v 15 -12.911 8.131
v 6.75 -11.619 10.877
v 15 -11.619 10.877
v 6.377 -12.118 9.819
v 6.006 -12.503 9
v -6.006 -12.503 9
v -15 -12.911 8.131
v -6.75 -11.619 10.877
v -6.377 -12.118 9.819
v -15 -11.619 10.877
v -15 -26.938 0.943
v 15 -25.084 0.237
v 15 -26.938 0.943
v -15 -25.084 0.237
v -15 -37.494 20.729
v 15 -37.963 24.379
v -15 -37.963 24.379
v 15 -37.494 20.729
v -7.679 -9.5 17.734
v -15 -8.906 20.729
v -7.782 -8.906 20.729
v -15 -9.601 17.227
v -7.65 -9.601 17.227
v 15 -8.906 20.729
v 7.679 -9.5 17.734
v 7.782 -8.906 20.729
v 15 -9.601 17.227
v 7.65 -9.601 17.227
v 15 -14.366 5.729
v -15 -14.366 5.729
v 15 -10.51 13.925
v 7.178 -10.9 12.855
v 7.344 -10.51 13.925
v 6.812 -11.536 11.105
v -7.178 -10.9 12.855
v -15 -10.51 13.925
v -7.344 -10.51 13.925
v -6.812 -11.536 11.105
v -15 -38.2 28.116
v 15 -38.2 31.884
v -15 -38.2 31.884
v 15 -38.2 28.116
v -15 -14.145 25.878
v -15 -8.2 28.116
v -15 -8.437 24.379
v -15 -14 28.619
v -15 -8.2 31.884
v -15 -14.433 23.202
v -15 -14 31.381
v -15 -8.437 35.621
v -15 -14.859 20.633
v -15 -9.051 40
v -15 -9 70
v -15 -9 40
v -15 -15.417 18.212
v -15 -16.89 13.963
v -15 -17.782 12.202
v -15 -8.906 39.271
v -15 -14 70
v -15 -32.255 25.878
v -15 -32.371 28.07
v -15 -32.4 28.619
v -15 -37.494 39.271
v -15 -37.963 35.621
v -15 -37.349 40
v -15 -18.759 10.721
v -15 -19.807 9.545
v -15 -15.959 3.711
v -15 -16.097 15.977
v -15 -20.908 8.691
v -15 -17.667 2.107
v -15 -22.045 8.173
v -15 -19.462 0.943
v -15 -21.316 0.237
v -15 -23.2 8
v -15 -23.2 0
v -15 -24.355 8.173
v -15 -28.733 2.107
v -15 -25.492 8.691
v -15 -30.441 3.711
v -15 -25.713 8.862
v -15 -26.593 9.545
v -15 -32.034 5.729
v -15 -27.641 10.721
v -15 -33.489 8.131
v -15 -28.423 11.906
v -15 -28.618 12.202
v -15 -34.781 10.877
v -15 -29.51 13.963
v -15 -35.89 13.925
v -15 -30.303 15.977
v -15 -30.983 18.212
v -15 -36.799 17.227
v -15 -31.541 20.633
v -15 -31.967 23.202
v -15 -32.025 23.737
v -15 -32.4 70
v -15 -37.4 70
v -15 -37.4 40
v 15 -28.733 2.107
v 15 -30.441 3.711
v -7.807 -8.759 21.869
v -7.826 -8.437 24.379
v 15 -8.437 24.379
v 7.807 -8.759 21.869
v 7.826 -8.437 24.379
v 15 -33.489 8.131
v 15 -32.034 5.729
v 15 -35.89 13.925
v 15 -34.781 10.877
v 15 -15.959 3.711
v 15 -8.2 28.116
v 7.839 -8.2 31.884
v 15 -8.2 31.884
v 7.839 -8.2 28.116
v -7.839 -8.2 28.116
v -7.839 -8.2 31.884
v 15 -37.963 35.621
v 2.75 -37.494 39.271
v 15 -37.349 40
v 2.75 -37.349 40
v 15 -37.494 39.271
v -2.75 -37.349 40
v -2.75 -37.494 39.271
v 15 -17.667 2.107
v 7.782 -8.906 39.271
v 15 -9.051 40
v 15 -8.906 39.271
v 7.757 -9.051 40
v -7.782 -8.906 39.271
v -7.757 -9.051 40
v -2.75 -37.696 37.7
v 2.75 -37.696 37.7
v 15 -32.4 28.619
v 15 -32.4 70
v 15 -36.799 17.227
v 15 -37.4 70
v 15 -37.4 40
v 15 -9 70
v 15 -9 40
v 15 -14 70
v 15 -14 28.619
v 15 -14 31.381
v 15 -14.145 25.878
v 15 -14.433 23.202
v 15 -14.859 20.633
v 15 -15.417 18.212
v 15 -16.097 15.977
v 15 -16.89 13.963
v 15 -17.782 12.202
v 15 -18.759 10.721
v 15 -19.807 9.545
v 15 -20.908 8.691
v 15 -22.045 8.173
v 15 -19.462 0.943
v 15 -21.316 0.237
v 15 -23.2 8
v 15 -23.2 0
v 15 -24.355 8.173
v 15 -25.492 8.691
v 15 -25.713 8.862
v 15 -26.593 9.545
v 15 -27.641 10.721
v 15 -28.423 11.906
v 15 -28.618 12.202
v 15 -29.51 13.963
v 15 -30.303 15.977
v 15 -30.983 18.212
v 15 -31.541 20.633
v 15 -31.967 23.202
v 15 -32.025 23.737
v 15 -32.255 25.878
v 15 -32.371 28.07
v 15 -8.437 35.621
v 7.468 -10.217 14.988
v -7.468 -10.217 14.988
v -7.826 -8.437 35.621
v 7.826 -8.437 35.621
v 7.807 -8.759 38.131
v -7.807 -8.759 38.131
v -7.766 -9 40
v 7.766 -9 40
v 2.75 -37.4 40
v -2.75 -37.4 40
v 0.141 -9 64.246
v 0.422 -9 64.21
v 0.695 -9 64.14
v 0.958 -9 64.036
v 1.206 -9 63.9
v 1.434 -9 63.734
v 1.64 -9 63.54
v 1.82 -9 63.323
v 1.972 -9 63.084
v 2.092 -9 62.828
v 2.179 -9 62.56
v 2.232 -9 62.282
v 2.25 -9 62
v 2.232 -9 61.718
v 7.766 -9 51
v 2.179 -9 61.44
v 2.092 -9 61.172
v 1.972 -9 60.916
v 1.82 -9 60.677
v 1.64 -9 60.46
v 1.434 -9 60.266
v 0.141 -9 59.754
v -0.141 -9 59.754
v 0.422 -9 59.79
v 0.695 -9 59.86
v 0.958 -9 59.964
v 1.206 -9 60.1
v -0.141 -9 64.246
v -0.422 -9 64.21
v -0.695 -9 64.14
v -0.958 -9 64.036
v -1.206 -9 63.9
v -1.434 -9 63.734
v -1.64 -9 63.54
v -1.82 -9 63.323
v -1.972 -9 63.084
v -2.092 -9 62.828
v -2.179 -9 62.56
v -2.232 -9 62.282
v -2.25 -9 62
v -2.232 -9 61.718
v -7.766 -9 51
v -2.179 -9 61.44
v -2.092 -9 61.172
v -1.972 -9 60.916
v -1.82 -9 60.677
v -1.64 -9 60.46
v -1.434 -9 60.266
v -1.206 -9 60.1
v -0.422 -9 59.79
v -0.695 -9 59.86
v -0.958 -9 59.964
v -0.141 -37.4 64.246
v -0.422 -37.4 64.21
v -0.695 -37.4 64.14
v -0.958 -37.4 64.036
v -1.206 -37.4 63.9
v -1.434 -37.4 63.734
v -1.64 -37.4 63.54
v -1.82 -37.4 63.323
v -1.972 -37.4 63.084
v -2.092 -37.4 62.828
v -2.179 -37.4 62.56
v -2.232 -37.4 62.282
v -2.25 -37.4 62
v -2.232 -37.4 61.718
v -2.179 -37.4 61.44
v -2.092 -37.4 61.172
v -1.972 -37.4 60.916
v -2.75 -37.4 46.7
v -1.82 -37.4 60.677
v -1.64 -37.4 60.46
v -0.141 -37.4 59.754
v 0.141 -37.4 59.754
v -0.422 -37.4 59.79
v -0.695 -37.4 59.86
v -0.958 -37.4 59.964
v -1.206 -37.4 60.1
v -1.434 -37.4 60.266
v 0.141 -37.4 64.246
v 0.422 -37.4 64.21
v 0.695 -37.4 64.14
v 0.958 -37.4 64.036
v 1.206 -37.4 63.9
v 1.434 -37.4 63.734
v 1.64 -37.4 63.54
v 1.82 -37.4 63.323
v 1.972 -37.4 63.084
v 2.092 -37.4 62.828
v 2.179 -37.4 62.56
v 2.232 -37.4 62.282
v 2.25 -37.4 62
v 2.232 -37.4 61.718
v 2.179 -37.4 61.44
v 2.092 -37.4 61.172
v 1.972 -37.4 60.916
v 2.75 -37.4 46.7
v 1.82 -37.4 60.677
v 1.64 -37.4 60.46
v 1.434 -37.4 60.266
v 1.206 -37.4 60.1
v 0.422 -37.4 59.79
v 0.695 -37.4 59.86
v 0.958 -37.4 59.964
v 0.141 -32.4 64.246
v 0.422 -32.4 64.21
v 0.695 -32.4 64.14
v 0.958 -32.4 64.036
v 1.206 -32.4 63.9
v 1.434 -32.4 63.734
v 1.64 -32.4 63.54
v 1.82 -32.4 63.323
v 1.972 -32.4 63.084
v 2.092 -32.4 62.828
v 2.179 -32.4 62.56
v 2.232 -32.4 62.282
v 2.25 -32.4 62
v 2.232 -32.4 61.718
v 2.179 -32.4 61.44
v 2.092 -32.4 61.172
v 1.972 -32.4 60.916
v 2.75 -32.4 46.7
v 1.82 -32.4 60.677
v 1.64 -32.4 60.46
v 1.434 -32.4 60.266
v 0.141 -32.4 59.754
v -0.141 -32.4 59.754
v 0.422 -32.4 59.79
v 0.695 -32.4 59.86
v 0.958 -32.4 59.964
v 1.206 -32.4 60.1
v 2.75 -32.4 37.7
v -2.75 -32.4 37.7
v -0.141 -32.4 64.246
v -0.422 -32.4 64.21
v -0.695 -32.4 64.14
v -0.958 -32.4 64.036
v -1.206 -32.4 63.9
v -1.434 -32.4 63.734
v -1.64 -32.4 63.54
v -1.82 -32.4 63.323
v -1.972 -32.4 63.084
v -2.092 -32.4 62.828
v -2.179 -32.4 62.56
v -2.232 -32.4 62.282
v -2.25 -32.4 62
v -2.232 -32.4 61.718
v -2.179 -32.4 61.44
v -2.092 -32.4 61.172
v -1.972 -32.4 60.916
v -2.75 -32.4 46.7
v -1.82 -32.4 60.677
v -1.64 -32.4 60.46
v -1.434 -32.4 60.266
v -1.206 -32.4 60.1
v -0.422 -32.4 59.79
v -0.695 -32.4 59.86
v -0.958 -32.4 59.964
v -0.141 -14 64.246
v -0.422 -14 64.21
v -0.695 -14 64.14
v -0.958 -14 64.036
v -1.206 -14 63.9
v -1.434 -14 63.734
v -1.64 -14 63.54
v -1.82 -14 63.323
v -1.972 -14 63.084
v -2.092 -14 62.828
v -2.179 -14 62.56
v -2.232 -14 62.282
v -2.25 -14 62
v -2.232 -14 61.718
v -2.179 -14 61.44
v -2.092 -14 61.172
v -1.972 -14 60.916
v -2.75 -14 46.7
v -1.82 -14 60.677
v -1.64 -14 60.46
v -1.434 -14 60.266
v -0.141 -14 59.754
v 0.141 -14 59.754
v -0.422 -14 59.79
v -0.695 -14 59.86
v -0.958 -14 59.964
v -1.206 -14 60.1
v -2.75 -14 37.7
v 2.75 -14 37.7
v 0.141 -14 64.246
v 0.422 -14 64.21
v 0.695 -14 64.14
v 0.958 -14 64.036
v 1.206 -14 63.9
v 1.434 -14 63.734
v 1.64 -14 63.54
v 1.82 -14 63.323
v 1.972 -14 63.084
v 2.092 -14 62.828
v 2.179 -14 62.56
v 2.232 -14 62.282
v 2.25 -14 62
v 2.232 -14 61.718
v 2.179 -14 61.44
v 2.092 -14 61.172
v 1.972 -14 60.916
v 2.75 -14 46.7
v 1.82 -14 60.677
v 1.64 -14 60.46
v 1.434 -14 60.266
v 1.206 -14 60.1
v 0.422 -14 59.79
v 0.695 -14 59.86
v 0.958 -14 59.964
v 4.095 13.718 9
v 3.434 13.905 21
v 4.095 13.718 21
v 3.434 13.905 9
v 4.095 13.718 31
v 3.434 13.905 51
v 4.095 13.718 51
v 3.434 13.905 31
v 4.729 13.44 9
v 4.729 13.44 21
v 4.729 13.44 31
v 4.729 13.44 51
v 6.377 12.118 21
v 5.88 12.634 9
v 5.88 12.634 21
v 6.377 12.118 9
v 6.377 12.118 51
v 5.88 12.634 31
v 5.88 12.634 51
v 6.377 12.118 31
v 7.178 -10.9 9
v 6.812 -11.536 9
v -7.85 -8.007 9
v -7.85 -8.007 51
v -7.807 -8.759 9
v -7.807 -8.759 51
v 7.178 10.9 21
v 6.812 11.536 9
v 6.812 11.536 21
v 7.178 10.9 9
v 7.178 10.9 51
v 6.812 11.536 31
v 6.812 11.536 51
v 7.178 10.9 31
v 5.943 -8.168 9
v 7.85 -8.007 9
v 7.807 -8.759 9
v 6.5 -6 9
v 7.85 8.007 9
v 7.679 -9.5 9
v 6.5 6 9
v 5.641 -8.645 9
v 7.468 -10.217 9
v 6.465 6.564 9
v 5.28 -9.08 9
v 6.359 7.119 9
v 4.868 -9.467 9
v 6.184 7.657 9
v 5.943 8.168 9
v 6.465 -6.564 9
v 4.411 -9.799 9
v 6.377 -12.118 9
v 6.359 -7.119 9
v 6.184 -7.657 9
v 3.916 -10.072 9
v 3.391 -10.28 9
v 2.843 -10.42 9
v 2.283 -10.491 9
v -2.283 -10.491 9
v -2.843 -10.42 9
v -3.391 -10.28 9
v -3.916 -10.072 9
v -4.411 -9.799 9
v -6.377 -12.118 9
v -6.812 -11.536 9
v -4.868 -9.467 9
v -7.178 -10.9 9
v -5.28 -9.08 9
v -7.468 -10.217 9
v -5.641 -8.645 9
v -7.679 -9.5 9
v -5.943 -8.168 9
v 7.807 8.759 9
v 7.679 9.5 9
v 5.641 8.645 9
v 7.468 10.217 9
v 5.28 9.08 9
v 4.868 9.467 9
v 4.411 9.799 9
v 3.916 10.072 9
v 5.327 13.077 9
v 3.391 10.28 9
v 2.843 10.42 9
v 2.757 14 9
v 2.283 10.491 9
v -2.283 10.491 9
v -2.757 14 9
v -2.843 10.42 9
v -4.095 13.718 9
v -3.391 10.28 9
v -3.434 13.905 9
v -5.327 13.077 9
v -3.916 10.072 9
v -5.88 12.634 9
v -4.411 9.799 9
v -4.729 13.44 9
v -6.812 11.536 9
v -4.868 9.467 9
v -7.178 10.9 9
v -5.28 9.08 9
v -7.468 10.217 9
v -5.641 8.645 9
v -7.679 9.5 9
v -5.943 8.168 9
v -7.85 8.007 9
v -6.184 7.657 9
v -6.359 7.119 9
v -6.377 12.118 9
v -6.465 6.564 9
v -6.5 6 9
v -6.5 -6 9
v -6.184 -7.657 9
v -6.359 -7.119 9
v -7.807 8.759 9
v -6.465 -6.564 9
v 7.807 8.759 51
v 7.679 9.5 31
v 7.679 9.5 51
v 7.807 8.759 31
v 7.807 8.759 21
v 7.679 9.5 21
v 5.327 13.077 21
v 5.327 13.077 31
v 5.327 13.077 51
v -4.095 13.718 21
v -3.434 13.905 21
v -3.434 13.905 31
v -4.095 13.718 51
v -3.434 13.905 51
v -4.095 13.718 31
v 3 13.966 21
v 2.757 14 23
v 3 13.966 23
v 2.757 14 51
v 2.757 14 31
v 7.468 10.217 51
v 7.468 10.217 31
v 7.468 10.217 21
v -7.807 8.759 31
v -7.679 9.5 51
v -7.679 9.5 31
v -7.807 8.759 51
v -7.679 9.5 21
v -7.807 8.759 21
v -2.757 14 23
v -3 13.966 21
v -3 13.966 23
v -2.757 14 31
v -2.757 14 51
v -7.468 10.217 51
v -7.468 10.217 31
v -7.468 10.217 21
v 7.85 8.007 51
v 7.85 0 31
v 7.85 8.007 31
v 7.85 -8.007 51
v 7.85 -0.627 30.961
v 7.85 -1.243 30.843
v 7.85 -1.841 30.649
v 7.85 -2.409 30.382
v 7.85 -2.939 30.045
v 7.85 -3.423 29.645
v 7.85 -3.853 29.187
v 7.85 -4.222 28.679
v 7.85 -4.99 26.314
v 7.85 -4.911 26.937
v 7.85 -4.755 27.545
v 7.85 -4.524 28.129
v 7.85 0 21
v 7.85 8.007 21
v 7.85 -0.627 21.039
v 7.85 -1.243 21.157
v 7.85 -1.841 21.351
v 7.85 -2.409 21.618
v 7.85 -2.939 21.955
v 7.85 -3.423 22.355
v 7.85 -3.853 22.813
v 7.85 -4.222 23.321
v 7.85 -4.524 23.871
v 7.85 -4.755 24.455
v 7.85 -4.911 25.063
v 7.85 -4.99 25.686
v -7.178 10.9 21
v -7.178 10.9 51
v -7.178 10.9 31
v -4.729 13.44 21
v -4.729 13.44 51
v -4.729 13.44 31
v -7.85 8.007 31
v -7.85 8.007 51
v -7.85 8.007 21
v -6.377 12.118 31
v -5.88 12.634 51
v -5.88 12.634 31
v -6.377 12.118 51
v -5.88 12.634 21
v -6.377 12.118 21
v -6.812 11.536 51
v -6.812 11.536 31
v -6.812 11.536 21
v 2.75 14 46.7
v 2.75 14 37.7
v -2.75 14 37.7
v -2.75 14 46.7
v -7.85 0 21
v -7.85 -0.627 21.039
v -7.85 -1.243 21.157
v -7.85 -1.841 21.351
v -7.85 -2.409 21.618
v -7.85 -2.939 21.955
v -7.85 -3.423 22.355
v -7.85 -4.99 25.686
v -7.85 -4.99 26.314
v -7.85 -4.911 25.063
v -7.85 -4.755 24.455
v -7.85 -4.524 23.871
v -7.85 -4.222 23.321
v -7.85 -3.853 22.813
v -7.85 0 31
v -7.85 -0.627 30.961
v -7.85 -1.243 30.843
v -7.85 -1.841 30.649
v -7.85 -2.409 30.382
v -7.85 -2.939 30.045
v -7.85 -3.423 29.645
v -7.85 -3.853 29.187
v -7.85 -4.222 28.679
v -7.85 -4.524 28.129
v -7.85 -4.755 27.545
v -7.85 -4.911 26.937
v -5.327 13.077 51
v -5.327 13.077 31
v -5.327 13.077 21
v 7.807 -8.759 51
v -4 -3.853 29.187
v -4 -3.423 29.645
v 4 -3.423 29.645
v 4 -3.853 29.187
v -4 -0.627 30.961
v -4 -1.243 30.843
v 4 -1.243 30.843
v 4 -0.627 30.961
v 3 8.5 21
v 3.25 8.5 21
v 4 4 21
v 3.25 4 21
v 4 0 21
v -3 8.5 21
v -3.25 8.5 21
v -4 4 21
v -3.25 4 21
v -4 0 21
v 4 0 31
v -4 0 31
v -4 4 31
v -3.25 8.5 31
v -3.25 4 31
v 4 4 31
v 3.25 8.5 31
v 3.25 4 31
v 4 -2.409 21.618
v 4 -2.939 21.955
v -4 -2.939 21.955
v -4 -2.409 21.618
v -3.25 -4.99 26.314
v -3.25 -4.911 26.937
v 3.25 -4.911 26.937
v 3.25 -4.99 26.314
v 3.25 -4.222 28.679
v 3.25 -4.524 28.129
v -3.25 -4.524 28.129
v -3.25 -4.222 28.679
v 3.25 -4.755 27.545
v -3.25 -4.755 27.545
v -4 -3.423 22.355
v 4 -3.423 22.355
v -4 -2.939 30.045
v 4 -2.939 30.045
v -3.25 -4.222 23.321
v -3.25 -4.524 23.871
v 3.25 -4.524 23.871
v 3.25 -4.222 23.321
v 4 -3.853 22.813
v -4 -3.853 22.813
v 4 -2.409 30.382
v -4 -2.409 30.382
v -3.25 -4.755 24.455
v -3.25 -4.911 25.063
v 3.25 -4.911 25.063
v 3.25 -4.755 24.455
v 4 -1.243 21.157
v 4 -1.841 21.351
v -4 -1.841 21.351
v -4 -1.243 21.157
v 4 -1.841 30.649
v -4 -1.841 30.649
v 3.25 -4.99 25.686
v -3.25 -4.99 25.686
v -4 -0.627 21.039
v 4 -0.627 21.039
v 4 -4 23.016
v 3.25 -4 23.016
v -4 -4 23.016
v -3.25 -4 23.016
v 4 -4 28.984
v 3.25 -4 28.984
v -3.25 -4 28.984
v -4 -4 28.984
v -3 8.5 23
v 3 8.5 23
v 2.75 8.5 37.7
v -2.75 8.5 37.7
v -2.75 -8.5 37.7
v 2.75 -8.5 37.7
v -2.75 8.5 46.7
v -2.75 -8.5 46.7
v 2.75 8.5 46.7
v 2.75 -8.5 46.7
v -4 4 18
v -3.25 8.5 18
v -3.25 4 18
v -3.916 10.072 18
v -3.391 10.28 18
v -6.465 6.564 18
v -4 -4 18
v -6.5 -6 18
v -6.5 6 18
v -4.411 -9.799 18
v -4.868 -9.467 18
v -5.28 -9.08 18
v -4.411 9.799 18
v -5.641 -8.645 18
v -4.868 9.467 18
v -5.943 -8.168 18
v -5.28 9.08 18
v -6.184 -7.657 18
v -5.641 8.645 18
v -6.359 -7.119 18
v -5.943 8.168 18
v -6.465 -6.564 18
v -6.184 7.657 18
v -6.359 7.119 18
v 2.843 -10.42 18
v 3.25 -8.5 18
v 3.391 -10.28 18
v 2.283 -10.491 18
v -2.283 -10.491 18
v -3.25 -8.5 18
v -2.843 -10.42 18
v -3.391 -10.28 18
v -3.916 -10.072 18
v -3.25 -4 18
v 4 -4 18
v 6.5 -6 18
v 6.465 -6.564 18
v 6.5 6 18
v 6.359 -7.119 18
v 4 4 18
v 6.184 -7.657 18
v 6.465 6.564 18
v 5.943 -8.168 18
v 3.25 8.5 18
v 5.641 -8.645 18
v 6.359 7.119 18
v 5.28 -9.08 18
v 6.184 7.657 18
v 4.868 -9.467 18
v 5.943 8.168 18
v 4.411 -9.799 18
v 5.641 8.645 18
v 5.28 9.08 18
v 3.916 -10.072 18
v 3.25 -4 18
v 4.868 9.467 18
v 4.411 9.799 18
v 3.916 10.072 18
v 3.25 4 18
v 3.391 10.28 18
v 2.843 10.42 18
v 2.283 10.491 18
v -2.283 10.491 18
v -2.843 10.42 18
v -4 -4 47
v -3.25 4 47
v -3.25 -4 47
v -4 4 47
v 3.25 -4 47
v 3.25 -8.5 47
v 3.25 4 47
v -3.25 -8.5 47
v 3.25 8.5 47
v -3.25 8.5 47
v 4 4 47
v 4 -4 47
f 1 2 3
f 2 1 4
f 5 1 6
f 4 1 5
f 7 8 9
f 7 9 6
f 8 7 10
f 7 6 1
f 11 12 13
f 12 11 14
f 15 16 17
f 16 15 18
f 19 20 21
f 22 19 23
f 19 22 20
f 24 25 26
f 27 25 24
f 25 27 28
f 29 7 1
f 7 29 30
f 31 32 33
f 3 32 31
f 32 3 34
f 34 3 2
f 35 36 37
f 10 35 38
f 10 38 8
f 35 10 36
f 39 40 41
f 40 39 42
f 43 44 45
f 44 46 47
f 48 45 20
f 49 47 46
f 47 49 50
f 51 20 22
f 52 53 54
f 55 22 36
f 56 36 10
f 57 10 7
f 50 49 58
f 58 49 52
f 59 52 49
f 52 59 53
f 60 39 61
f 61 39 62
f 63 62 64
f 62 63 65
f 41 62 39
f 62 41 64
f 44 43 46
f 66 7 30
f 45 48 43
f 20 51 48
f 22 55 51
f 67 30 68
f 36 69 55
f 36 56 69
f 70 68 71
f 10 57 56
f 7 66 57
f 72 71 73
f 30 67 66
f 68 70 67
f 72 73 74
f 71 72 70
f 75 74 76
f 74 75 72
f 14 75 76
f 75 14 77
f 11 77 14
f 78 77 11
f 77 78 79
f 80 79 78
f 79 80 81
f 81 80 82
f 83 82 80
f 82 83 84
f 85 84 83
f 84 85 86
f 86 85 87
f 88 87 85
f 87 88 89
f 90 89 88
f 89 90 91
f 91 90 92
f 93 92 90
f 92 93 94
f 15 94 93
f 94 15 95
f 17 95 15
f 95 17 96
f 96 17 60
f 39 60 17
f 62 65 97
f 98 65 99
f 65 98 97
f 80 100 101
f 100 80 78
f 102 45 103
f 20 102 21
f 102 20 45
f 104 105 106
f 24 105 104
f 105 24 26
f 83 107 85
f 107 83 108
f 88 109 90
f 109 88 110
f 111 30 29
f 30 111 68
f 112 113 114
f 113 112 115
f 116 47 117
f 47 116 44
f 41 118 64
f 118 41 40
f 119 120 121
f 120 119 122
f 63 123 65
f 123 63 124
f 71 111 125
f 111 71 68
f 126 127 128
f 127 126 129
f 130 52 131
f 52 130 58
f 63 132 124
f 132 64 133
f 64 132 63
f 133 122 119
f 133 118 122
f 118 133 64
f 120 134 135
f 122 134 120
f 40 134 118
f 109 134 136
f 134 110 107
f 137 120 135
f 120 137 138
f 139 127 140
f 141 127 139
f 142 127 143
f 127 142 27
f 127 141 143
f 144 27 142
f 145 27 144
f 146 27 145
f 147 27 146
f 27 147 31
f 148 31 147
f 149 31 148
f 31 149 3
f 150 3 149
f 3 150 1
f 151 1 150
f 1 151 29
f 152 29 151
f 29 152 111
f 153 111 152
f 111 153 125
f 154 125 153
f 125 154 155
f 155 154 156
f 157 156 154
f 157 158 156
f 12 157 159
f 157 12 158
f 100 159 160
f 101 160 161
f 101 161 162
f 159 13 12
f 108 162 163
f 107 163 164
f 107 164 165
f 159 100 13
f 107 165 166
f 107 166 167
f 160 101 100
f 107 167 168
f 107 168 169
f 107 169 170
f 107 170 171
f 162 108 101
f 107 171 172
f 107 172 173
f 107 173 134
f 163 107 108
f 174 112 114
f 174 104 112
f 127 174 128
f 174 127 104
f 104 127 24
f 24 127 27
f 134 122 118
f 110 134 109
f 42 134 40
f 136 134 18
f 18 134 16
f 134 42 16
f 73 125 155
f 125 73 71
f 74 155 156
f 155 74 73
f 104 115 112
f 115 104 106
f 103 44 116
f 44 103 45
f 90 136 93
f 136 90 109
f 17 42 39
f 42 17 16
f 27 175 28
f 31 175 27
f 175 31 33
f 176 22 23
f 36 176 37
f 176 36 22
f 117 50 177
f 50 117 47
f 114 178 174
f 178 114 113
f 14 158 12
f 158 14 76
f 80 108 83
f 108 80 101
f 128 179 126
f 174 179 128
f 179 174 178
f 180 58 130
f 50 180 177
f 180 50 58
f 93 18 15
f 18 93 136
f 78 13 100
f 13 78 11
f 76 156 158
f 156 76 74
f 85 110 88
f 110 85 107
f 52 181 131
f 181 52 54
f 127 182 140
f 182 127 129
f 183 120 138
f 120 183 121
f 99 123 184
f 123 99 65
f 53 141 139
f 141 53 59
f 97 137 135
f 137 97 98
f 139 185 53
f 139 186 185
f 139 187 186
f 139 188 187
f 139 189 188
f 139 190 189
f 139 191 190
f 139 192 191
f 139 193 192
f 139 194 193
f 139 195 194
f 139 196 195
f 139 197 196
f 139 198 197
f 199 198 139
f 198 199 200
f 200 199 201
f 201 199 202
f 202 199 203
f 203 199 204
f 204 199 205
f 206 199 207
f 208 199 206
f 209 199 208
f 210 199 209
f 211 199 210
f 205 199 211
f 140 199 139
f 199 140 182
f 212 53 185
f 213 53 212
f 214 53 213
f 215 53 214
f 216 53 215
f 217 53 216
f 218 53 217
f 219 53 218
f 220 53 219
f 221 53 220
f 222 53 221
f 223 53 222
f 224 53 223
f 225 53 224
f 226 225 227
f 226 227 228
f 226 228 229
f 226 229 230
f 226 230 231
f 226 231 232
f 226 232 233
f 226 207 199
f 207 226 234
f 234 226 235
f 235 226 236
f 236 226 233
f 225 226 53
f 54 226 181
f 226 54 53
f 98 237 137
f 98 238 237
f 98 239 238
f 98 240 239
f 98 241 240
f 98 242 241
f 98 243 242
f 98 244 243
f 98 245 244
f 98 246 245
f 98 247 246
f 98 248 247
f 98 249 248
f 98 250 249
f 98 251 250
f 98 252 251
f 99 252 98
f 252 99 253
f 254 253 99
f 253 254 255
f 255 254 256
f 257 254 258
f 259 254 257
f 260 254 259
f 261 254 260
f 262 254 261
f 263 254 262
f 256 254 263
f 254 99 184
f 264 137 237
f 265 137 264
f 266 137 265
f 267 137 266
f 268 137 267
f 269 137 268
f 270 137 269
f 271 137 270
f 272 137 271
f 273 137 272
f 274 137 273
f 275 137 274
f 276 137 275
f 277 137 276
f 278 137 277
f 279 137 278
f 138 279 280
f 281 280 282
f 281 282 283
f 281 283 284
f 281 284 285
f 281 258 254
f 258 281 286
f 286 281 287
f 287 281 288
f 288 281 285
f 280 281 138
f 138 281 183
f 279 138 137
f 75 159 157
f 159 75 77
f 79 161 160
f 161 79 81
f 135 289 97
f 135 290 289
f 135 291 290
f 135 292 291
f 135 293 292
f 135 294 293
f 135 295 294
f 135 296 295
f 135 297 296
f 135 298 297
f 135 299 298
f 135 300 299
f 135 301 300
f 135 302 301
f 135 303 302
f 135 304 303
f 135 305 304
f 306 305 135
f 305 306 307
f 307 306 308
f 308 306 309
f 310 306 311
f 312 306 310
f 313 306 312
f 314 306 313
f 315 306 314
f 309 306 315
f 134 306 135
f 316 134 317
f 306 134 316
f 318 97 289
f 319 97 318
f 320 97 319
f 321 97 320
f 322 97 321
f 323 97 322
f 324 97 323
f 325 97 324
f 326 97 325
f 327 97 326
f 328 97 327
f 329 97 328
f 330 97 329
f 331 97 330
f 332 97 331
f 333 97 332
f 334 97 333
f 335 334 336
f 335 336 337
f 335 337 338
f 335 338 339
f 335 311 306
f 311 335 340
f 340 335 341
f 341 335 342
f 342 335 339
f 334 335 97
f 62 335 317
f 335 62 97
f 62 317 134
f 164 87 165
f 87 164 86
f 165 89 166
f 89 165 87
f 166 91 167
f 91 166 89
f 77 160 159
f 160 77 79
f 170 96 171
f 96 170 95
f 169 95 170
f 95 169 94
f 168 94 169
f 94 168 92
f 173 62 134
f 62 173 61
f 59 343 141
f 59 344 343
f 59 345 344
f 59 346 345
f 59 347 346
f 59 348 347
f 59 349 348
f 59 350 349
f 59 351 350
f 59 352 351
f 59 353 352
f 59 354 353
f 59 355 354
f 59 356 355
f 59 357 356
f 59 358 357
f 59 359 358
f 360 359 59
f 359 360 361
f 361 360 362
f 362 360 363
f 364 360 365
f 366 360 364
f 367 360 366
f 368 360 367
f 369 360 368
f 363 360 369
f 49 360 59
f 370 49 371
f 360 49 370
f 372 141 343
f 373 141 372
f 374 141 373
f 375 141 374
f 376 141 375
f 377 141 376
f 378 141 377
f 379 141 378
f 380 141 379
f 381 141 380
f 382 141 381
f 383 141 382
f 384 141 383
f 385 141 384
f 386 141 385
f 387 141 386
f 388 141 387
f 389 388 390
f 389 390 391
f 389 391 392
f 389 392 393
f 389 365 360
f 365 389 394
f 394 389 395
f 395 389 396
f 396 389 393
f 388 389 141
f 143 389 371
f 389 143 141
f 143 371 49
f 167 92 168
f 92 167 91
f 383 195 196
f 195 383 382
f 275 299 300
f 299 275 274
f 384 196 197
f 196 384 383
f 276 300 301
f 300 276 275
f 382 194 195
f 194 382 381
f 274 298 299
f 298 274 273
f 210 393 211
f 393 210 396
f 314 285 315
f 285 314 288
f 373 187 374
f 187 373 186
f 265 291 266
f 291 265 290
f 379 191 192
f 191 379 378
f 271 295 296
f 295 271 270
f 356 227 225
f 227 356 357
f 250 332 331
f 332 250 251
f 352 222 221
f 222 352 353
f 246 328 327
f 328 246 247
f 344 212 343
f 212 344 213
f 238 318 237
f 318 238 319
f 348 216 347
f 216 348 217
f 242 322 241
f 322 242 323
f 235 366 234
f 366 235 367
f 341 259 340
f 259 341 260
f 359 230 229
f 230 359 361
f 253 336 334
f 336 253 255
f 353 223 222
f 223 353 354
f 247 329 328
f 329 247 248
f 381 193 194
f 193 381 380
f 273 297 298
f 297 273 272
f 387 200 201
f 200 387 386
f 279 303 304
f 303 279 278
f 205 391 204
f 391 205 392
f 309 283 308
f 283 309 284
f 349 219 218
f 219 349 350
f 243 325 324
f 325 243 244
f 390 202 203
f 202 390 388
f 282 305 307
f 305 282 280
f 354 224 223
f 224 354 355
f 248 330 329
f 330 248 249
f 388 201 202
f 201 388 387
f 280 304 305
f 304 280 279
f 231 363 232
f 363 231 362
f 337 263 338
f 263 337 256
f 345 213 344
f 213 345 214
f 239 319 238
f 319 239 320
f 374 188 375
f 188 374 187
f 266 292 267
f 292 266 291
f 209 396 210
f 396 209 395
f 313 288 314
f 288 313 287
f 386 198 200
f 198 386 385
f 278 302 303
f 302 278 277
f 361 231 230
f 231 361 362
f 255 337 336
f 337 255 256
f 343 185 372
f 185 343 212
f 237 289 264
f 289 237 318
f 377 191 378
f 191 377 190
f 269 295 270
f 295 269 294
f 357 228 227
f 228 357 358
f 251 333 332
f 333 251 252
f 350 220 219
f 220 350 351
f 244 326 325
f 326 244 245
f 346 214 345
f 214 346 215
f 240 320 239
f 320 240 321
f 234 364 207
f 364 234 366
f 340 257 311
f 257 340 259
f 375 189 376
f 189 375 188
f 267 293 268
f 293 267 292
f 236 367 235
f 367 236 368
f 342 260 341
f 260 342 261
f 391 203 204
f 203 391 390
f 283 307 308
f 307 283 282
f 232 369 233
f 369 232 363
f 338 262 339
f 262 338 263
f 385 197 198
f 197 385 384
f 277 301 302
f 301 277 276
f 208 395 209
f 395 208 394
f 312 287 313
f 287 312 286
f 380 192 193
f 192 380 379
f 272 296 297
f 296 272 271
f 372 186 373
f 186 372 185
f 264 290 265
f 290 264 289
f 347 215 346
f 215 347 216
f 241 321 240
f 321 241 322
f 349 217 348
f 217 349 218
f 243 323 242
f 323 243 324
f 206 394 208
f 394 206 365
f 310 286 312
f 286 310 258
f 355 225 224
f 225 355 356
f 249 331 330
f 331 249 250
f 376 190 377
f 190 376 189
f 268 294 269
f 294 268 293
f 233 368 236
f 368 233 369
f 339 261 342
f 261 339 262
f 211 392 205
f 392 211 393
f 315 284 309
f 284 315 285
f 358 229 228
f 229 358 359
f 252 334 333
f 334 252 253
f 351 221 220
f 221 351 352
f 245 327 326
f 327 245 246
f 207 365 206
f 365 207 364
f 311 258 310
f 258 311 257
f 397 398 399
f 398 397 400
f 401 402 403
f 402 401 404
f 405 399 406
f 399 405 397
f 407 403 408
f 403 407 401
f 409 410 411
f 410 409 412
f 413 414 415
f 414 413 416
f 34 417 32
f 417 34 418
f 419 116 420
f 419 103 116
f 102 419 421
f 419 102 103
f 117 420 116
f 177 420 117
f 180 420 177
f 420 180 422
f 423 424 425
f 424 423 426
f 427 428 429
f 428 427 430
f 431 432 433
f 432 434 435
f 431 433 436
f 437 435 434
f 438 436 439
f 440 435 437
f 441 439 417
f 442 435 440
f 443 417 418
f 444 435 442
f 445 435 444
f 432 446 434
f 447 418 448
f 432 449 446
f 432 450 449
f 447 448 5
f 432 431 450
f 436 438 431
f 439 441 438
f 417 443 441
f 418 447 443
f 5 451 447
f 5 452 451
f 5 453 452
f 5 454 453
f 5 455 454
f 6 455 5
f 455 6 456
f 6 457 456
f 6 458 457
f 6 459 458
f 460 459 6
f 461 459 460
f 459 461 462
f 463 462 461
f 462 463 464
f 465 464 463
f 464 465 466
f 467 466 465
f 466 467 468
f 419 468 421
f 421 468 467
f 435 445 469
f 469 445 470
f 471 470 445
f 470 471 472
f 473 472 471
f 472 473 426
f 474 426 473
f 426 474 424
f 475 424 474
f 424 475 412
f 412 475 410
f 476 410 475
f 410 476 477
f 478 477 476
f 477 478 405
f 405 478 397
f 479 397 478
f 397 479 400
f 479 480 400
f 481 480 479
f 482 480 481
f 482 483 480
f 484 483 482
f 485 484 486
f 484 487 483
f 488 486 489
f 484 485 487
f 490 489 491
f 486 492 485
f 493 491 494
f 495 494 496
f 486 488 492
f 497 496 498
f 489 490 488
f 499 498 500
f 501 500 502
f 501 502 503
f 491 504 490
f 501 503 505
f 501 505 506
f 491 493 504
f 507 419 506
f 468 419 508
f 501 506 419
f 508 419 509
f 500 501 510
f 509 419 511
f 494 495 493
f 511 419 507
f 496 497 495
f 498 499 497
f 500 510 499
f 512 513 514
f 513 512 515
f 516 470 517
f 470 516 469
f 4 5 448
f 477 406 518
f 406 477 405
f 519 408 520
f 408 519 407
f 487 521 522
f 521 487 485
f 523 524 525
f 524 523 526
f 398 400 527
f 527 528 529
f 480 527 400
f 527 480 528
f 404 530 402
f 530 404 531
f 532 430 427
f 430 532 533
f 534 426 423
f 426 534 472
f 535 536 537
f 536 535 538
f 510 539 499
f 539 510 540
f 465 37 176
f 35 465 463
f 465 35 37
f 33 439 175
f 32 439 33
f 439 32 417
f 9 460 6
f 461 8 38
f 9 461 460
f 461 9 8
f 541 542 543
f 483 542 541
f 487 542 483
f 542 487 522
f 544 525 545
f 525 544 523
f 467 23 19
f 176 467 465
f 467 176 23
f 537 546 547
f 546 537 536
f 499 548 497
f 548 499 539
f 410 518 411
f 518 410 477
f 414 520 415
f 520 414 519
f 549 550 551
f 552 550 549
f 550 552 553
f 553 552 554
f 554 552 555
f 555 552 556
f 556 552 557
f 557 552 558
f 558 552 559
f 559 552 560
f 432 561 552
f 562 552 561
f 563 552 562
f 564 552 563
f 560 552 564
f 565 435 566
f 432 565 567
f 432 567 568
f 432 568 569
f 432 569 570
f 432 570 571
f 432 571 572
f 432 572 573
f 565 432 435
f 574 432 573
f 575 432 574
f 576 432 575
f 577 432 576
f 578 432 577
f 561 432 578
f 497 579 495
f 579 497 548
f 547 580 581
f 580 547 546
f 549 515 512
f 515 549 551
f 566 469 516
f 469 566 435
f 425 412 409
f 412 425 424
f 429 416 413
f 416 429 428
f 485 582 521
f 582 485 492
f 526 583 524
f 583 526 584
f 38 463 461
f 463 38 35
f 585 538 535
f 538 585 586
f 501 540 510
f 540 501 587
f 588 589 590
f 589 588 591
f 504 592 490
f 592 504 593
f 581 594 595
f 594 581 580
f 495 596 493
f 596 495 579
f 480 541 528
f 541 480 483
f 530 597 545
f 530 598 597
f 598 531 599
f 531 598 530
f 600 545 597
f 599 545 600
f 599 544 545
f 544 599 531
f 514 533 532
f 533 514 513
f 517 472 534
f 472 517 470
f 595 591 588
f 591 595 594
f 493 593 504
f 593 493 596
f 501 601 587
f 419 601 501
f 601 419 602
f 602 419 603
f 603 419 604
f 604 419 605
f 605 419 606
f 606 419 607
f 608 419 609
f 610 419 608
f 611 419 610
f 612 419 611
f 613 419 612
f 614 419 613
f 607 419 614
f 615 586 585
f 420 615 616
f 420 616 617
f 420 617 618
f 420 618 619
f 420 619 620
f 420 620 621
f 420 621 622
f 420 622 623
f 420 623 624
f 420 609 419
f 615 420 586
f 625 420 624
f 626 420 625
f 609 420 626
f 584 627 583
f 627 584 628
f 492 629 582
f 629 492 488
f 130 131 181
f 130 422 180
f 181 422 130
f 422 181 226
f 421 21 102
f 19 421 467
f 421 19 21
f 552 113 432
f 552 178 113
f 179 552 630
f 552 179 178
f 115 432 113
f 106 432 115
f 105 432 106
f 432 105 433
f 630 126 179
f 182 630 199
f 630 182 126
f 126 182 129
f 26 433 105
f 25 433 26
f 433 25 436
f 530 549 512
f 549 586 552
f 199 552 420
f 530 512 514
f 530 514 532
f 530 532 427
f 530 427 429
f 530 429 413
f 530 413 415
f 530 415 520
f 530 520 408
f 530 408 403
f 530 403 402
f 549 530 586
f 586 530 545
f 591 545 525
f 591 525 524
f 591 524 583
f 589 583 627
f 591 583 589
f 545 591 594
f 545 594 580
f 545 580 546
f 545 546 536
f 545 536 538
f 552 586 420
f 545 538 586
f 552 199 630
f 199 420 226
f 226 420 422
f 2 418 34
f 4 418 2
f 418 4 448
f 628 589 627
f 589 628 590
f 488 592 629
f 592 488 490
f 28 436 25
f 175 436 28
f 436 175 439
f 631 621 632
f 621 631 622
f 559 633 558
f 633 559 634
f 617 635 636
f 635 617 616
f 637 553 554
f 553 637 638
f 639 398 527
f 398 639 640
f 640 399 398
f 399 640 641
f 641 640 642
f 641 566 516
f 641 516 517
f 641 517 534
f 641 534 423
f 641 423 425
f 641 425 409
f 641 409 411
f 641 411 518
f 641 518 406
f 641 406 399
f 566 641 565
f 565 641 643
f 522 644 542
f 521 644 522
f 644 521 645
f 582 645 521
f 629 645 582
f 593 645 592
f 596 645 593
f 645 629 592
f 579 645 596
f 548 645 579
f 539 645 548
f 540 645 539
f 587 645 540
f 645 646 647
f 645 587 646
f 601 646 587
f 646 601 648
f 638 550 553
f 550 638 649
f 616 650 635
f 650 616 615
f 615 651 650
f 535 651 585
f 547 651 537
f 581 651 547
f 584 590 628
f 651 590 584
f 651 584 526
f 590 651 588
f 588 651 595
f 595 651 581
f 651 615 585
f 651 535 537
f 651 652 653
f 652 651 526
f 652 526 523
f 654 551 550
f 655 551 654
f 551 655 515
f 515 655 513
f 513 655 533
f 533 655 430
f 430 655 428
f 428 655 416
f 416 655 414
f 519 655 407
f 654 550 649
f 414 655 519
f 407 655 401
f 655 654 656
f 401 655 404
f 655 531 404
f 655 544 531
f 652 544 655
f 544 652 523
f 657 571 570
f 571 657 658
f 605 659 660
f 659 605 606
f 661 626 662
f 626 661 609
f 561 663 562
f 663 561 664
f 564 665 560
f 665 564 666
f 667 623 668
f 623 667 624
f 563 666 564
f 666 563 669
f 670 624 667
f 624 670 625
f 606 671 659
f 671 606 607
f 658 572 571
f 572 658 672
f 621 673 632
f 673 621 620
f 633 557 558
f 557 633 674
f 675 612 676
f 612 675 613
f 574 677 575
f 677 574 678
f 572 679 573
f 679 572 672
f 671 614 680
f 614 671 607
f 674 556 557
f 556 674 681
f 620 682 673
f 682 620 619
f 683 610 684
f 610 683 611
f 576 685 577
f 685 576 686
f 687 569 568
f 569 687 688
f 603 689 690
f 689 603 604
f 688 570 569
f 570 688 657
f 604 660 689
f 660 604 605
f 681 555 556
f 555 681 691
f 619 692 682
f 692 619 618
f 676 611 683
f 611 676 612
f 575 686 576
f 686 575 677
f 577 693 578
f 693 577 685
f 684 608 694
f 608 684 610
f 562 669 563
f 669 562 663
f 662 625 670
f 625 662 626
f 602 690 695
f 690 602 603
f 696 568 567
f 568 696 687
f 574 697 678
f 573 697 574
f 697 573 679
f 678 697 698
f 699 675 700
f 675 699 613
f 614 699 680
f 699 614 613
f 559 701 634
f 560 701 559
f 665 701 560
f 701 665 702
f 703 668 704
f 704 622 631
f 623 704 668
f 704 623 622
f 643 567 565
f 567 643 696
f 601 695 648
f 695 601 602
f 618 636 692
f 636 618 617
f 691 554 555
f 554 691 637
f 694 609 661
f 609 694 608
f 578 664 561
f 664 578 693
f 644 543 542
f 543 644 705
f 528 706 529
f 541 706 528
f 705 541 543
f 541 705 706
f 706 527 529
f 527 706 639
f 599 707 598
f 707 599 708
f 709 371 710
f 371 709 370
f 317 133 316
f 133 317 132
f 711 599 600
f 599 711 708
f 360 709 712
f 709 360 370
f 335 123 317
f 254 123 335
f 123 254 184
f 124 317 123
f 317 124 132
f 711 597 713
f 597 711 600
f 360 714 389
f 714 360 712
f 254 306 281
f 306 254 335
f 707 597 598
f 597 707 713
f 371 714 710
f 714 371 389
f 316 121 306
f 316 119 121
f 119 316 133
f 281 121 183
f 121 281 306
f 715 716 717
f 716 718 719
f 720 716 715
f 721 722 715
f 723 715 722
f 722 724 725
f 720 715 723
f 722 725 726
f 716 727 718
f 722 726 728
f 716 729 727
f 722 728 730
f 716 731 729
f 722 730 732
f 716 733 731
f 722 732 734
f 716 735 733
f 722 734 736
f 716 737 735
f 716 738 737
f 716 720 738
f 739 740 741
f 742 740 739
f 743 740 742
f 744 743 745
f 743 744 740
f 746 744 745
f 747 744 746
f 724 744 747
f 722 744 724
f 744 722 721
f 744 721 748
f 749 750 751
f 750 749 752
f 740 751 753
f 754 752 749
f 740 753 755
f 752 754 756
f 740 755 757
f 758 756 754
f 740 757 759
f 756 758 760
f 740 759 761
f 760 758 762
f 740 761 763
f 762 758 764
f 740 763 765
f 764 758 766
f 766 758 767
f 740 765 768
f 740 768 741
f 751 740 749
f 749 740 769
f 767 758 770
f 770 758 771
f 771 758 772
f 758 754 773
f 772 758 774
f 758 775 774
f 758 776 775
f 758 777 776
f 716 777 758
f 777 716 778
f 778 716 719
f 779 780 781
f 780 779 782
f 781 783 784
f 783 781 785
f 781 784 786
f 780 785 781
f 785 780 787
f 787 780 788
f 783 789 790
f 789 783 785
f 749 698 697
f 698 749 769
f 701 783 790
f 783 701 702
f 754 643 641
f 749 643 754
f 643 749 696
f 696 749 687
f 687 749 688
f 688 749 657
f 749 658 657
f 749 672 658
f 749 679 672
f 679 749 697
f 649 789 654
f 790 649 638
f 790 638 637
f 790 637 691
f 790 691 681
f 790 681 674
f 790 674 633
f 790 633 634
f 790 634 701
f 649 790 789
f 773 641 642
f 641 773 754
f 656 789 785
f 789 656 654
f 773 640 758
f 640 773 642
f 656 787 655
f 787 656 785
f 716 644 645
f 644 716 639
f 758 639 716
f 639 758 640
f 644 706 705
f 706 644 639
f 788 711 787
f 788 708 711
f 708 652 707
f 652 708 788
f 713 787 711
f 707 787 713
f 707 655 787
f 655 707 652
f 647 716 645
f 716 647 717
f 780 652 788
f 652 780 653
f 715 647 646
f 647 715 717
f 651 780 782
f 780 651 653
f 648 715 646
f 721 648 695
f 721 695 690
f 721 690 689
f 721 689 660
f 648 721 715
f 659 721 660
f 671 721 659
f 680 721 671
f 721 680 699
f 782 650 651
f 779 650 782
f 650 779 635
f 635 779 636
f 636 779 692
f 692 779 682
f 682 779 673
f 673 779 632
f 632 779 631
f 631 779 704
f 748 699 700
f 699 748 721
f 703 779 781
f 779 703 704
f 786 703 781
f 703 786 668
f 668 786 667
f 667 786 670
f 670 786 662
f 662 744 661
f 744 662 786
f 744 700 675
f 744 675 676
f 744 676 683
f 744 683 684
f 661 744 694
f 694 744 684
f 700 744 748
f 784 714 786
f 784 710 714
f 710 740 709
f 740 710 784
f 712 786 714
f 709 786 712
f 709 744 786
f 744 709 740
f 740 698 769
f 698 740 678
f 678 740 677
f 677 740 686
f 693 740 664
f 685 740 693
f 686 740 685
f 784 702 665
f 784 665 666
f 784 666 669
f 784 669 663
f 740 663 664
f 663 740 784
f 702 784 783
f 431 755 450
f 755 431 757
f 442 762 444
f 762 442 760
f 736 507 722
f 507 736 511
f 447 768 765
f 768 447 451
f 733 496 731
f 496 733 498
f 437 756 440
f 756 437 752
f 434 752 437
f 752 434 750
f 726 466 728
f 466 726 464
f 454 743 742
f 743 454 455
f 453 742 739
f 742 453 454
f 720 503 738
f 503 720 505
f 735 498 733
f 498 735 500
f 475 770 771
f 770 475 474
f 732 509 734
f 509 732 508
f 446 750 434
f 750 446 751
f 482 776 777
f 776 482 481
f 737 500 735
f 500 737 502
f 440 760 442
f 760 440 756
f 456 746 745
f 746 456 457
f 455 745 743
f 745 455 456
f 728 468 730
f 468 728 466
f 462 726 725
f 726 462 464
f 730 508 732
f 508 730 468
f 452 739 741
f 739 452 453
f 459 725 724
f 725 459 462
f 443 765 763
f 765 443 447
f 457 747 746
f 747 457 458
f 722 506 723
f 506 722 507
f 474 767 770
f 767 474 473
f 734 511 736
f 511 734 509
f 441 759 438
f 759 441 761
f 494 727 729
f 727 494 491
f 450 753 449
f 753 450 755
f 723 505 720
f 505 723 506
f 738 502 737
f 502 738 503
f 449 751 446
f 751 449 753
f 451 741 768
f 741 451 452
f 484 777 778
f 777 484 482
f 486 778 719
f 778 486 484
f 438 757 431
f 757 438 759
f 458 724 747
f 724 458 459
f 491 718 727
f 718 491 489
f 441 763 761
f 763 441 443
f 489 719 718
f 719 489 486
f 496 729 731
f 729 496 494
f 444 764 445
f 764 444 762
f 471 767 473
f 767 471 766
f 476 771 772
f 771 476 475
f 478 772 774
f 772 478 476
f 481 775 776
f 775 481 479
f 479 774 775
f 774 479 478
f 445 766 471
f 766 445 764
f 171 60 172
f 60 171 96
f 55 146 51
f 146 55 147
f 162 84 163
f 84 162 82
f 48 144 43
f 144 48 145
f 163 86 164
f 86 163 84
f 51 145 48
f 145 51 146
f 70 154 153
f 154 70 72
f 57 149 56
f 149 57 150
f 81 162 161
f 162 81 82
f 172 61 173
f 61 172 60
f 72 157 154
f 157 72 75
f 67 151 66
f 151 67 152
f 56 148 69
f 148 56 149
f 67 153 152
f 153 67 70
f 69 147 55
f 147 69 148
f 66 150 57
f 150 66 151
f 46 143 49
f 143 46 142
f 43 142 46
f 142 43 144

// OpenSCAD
$fn = 50;

hole1_r = 4.5;
hole1_depth = 13;
hole1_width = 21;
hole1_height = 9;

hole2_height = 29;
hole2_small_depth = 8;
hole2_small_width = 8;
hole2_big_depth = 6.5;
hole2_big_width = 17;


hole3_height = 9;
hole3_width = 90;
hole3_depth = 5.5;
hole3_position = 28.7;

hole4_d = 10;
hole4_width = 15;
hole4_depth = 20;
hole4_position = 12;

hole4_helper_height = 2;
hole4_helper_width = 40;
hole4_helper_depth = 6;

body_width = 28;
body_depth = 15.7;
body_height = 42;

stick_height = 44;
stick_width = 18.4;
stick_depth = 50;

holder_height = 60;
holder_width = 30;
holder_depth = 30;

connector_height = 7;

keeper_height = 30;
keeper_width = stick_width + 10;
keeper_depth = holder_depth;
keeper_position = holder_height - 20;

keeper_cut_height = 60;
keeper_cut_width = stick_width;
keeper_cut_depth = holder_depth;
keeper_cut_position = holder_height - 30;

screw_hole_d = 4.5;
screw_hole_position = keeper_position + keeper_height - 8;
screw_hole_width = 2 * holder_width;

module hole1() {
    translate(
        [
            -(hole1_depth-2*hole1_r)/2,
            -(hole1_width-2*hole1_r)/2,
            0
        ]
    )
    linear_extrude(height=hole1_height)
    minkowski() {
        circle(hole1_r);
        square([hole1_depth - 2*hole1_r, hole1_width - 2*hole1_r]);
    };
};


module hole2() {
    linear_extrude(height=hole2_height) {
        square([hole2_small_depth, hole2_small_width], center=true);
        square([hole2_big_depth, hole2_big_width], center=true);
    }
};

module hole3() {
    linear_extrude(height=hole3_height)
    square([hole3_depth, hole3_width], center=true);
};

module hole4() {
    difference() {
        translate([0, 0, hole4_d/2])
        rotate([0, 90, 0])
        translate([0, 0, -hole4_depth/2])
        linear_extrude(height=hole4_depth)
        hull() {
            circle(hole4_d/2);
            translate([-hole4_d/2, 0])
            square([hole4_d, hole4_width]);
        };

        linear_extrude(height=hole4_helper_height)
        square([hole4_helper_depth, hole4_helper_width], center=true);
    };
};

module hole() {
    union() {
        translate([0, 0, hole4_position])
        hole4();
        translate([0, 0, hole3_position])
        hole3();
        translate([0, 0, hole1_height])
        hole2();
        hole1();
    };
};

module body_base() {
    resize([body_depth, body_width])
    translate(
        [
            -(hole1_depth-2*hole1_r)/2,
            -(hole1_width-2*hole1_r)/2,
        ]
    )
    minkowski() {
        circle(hole1_r);
        square([hole1_depth - 2*hole1_r, hole1_width - 2*hole1_r]);
    };

};

module body() {
    linear_extrude(height=body_height)
    body_base();
};

module stick() {
    rotate([0, 90, 0])
    translate([0, 0, -stick_depth/2])
    linear_extrude(height=stick_depth)
    resize([stick_height, stick_width])
    circle(1);
};

module holder_body() {
    hull() {
        translate([0, 0, holder_height/2])
        rotate([0, 90, 0])
        translate([0, 0, -holder_depth/2])
        linear_extrude(height=holder_depth)
        resize([holder_height, holder_width])
        circle(1);
    };
};

difference() {
    union() {
        translate([0, 0, -(body_height - holder_height)/2])
        body();
        translate([
            0,
            -(stick_width+body_width)/2,
            0
        ])
        holder();
    };
    translate([0, 0, -(body_height - holder_height)/2])
    hole();
    translate([
                0,
                -(stick_width+body_width)/2,
                holder_height/2
            ])
    stick();
};

module holder() {
    difference() {
        union() {
            holder_body();
            translate([0, 0, keeper_position])
            linear_extrude(height=keeper_height)
            square([keeper_depth, keeper_width], center=true);
        };
        translate([
                    0,
                    0,
                    holder_height/2
                  ])
        stick();
    
        translate([0, 0, keeper_cut_position])
        linear_extrude(height=keeper_cut_height)
        square([keeper_cut_depth, keeper_cut_width], center=true);
    
        translate([0, 0, screw_hole_position])
        rotate([90, 0, 0])
        cylinder(r1=screw_hole_d/2, r2=screw_hole_d/2, h=screw_hole_width, center=true);
    }
};
